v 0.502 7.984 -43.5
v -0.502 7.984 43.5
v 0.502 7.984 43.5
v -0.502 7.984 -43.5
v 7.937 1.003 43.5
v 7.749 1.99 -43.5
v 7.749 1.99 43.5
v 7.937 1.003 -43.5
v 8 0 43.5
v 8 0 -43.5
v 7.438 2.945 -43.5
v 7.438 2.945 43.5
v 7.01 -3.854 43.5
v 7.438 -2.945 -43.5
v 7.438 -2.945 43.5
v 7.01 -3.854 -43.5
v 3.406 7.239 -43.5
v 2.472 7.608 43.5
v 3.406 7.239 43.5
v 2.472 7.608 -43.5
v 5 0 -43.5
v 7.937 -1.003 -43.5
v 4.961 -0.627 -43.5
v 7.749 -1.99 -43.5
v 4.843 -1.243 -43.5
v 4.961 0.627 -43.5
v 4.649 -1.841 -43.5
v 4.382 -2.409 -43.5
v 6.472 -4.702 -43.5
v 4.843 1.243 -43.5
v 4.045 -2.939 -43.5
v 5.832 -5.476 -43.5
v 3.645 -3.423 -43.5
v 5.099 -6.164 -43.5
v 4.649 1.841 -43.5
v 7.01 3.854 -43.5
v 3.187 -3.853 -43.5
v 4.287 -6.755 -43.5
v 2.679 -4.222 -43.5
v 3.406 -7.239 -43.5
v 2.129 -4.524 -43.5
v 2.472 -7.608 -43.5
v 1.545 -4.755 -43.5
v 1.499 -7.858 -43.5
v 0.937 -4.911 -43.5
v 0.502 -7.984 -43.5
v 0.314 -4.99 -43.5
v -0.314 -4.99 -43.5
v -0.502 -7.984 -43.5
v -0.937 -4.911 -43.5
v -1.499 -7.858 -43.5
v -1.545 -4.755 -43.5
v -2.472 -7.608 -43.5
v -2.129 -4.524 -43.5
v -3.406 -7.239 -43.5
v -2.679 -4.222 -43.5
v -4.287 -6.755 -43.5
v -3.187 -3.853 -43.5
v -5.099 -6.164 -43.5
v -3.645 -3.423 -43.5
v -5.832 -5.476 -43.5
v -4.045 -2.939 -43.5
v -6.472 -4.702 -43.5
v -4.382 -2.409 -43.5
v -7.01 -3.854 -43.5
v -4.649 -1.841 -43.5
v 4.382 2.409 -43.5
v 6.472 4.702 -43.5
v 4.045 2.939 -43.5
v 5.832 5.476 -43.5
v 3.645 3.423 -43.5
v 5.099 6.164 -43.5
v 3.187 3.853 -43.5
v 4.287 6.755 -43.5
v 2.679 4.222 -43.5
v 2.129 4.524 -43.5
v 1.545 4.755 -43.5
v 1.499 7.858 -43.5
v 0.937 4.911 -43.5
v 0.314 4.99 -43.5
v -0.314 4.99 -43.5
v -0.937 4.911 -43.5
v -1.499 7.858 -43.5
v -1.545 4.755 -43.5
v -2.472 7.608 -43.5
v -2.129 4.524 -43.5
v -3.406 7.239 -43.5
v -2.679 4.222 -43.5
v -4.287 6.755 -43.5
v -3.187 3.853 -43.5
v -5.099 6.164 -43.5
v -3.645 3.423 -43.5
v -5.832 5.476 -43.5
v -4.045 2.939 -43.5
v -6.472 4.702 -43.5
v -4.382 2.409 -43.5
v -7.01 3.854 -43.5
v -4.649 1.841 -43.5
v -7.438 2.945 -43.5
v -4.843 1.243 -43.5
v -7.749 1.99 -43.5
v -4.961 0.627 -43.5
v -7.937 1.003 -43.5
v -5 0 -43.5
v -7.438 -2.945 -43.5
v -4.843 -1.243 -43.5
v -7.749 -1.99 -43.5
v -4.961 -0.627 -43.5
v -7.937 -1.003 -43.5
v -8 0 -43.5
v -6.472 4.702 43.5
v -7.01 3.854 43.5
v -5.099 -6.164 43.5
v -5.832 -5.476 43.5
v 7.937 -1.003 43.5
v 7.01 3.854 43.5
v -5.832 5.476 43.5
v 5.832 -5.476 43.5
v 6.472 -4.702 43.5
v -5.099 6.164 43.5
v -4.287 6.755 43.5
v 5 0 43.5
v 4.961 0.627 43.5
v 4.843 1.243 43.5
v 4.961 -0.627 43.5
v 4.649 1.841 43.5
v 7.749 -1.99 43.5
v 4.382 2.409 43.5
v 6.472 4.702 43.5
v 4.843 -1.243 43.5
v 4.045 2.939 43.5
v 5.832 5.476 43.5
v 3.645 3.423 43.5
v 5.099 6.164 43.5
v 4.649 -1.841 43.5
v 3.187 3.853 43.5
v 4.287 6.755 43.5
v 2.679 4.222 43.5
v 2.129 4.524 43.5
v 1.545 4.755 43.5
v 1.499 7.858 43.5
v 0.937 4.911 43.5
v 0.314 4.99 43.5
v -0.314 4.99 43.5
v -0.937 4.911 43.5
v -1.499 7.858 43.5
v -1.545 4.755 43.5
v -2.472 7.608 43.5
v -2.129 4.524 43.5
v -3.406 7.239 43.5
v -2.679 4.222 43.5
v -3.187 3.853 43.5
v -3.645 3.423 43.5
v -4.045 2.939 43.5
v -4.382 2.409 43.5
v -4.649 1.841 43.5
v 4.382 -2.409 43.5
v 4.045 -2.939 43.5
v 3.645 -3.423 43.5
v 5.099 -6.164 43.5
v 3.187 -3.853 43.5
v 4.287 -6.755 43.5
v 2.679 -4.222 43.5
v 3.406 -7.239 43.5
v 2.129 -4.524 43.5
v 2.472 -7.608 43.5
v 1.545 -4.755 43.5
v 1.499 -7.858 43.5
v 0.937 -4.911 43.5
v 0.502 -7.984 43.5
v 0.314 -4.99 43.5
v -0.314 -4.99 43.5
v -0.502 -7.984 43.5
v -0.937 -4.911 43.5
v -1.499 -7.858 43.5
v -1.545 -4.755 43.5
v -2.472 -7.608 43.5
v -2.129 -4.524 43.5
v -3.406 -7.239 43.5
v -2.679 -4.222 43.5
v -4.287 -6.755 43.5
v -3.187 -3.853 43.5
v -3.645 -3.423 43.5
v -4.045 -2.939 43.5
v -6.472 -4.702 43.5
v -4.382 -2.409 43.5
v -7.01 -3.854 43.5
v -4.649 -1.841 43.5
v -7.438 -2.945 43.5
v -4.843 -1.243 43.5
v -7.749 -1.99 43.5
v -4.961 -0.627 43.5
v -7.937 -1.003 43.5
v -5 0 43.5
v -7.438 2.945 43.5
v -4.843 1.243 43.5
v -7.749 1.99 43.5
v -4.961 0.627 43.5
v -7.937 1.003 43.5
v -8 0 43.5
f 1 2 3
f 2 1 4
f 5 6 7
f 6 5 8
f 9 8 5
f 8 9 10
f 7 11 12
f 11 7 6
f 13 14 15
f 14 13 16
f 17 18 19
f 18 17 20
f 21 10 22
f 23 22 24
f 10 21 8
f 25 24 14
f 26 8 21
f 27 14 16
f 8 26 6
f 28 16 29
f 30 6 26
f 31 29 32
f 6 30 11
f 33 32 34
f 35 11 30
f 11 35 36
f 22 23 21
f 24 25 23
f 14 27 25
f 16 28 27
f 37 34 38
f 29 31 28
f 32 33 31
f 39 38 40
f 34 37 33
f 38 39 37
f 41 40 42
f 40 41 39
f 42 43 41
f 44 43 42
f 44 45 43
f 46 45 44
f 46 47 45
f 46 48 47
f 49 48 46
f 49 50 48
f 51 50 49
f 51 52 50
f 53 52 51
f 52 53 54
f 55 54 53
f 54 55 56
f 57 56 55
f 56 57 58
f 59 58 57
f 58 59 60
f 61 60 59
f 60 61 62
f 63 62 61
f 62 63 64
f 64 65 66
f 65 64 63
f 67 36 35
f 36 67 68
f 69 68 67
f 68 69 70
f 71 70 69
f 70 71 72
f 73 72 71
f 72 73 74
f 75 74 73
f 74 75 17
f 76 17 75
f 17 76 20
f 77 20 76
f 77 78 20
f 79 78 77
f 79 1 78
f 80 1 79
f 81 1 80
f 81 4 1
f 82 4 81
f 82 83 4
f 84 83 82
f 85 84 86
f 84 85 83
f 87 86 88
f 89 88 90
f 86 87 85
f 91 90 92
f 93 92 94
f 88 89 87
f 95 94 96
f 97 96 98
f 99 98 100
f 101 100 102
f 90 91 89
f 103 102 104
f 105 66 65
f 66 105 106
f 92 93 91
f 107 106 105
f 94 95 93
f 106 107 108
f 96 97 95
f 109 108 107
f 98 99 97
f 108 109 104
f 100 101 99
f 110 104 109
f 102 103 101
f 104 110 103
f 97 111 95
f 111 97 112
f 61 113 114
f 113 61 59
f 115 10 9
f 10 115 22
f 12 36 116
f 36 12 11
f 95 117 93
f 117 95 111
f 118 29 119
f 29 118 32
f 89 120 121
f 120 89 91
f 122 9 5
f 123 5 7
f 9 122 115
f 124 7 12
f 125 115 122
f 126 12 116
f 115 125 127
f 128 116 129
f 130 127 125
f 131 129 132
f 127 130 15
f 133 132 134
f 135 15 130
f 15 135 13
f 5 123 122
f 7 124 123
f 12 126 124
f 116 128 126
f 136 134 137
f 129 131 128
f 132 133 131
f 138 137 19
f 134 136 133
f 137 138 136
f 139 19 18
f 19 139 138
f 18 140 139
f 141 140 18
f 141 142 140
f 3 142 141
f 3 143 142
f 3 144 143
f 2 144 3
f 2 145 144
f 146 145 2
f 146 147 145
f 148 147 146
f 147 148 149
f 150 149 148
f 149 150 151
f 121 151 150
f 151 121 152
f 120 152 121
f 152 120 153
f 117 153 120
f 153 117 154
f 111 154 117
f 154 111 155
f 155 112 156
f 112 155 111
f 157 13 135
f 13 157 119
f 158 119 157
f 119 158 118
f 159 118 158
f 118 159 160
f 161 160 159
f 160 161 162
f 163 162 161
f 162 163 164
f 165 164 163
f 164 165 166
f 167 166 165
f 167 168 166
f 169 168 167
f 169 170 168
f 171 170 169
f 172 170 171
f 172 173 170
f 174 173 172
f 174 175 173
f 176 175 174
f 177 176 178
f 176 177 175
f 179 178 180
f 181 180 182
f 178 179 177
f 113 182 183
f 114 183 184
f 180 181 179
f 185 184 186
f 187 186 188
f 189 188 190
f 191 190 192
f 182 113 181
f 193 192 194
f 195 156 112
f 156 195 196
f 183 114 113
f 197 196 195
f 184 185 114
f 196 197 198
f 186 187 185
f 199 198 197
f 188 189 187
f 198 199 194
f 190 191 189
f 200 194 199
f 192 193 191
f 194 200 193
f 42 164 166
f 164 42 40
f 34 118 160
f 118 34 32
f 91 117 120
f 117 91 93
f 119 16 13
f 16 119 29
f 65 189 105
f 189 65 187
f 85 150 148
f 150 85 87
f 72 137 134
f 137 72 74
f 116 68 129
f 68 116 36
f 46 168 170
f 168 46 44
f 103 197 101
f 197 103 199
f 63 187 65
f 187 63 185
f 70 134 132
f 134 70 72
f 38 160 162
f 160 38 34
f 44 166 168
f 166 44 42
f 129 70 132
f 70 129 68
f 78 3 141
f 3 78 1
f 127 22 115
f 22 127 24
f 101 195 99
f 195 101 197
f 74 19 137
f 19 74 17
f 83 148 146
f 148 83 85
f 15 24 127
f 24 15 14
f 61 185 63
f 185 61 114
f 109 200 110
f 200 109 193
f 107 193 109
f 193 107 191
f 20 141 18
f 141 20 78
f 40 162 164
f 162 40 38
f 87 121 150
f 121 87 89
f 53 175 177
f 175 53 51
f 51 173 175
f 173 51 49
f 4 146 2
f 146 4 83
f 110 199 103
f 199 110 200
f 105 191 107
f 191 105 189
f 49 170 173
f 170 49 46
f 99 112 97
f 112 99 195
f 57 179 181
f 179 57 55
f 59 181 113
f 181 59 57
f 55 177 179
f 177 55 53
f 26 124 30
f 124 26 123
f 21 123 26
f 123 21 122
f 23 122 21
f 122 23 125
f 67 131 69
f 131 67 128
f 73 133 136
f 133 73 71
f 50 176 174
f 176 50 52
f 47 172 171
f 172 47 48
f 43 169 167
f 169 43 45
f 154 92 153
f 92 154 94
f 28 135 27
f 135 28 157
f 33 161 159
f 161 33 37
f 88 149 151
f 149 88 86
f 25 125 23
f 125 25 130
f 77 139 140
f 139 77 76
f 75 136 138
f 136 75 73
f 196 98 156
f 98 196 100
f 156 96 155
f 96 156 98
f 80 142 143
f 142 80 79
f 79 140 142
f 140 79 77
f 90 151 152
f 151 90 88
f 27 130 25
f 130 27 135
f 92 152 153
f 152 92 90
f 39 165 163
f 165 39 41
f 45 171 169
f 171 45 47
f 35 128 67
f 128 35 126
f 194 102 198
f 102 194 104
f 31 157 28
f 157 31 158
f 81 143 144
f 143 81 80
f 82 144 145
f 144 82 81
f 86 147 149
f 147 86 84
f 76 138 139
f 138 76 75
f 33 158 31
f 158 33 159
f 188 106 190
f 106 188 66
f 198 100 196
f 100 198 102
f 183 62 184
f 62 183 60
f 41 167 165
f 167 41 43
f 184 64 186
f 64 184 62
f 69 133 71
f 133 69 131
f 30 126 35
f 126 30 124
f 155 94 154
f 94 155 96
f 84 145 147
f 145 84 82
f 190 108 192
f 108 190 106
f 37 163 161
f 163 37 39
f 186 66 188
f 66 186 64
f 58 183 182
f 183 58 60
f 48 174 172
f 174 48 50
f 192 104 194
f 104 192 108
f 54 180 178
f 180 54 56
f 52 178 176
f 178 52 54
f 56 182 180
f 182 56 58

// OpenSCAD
$fn = 50;


difference() {
	union() {
		translate(v = [0, 0, -43.5000000000]) {
			cylinder(h = 87, r = 8.0000000000);
		}
	}
	union() {
		translate(v = [0, 0, -100.0000000000]) {
			cylinder(h = 200, r = 5.0000000000);
		}
	}
}
